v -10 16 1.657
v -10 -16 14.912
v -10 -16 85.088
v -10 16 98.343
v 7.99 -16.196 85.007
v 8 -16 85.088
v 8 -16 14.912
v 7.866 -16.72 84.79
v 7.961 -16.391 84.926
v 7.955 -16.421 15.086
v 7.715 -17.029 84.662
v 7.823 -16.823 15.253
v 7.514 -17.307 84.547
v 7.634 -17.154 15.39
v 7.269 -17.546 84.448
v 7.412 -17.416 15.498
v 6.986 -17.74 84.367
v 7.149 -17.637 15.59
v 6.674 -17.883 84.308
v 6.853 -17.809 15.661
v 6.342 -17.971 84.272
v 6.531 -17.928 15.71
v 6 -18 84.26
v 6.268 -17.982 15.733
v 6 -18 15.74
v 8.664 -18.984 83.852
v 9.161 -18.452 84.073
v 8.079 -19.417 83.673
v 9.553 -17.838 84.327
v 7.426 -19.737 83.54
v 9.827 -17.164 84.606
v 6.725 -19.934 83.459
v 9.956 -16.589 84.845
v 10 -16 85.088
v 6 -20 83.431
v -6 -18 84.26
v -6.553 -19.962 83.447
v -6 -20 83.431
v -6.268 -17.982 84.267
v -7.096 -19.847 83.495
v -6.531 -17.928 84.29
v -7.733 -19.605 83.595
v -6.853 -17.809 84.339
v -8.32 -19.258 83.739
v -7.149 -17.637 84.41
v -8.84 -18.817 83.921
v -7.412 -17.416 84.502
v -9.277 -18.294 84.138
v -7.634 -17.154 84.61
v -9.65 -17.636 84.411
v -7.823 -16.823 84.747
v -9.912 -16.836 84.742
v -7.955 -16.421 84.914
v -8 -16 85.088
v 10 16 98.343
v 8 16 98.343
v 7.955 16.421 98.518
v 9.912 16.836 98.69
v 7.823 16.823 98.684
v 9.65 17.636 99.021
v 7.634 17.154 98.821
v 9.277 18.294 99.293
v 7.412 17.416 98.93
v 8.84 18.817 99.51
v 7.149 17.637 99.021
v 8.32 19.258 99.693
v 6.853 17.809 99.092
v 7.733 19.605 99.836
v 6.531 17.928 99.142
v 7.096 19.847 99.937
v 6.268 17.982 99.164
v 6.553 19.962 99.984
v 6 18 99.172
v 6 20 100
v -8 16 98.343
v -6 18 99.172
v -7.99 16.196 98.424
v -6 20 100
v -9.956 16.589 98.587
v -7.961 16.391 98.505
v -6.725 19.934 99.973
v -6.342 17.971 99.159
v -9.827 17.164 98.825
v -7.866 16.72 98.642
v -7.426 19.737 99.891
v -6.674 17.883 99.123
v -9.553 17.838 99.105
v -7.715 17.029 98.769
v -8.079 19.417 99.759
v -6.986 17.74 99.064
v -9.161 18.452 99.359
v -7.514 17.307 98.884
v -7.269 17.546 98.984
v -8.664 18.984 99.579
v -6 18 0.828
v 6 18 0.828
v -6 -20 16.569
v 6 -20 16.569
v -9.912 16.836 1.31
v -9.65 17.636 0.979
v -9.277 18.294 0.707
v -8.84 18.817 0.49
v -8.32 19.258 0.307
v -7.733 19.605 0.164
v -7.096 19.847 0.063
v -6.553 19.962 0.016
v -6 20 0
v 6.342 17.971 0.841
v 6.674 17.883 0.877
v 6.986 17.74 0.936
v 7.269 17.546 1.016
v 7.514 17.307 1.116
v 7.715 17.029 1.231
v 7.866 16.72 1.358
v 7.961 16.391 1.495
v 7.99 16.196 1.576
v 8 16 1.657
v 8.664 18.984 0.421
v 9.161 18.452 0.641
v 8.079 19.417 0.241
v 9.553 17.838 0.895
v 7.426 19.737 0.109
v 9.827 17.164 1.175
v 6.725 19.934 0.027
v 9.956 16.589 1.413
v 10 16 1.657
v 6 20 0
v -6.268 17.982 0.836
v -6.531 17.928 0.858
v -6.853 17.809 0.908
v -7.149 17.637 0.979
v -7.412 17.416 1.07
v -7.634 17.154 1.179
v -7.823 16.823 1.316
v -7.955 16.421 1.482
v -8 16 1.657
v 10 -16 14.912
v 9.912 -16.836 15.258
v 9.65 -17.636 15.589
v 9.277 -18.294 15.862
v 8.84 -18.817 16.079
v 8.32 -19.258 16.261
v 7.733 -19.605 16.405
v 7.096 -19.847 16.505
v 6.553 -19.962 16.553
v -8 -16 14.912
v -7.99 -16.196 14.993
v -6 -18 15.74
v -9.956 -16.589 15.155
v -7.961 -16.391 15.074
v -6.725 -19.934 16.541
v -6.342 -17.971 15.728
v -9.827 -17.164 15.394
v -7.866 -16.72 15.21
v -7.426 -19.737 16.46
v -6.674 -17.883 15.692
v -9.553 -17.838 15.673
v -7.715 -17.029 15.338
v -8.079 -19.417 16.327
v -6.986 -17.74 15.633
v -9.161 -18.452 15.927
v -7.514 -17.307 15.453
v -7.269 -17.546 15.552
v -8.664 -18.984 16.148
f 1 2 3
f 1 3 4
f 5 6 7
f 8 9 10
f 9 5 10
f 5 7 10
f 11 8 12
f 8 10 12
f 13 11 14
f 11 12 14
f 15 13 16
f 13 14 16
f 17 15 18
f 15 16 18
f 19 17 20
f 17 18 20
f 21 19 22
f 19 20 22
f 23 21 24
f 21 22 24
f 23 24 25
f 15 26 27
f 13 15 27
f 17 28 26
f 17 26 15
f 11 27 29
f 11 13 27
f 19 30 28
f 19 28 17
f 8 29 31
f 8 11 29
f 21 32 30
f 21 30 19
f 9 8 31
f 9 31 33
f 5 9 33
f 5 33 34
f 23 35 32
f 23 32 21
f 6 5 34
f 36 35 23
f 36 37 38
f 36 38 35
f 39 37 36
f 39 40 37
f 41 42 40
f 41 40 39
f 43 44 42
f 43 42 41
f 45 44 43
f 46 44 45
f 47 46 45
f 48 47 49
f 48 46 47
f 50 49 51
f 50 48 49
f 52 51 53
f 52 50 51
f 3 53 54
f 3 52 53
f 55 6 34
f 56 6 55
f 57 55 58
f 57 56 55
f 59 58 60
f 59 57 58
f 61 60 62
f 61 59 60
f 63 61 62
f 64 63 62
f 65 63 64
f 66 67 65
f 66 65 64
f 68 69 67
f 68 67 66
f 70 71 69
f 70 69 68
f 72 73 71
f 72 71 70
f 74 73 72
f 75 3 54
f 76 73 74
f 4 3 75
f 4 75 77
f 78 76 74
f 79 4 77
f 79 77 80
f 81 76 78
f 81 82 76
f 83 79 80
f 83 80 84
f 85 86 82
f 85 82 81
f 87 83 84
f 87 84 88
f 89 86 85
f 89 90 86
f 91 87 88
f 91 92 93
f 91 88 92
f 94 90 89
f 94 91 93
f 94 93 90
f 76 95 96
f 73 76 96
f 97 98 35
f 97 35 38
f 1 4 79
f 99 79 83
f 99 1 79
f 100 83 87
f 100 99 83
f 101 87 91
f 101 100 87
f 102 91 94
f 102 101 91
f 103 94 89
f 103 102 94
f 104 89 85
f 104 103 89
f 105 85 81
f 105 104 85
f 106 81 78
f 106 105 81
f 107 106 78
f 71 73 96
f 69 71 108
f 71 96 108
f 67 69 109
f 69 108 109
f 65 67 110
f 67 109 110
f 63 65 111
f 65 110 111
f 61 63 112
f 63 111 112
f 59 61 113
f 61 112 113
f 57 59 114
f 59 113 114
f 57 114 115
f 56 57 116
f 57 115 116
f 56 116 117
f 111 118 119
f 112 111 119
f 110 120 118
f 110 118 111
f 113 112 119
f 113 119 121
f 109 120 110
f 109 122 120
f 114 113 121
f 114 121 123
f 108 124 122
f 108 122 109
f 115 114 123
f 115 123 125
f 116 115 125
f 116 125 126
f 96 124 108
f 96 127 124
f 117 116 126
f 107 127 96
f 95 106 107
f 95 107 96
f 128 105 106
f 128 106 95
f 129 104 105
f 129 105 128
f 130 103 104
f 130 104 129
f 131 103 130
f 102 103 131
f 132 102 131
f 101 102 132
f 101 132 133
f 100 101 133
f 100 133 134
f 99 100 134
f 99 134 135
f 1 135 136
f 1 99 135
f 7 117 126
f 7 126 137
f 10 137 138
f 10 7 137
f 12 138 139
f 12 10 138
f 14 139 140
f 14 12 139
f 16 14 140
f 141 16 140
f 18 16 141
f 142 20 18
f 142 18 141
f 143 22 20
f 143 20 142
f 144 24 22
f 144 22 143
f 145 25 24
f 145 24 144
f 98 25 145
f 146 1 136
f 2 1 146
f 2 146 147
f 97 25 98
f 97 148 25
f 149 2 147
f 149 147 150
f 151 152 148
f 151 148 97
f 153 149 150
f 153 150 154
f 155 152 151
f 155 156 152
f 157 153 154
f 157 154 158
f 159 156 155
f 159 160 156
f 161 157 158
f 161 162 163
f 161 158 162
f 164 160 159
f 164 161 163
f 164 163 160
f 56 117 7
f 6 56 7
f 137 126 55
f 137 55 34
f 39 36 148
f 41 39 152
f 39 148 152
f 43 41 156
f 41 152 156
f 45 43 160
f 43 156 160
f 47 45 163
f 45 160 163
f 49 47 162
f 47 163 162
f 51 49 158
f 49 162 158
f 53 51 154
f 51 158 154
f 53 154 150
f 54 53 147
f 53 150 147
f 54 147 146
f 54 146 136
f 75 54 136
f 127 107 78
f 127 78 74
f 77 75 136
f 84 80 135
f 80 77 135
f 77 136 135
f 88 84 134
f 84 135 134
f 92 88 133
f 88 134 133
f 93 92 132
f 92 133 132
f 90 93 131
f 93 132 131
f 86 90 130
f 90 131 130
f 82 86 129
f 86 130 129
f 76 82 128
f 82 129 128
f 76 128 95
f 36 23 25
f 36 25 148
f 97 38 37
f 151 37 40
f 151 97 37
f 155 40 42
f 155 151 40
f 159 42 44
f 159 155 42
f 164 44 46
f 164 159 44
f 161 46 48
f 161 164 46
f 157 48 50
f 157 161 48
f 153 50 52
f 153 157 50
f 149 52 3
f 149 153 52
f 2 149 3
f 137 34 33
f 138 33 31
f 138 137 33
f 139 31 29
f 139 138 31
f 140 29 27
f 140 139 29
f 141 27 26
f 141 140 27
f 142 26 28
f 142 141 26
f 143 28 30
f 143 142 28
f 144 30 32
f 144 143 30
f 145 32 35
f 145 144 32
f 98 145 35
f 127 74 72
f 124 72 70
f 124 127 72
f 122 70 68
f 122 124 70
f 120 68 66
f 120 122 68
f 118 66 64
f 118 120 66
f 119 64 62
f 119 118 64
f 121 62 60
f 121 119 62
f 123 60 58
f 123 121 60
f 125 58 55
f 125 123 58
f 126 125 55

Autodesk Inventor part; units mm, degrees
ref_plane "Start Plane" through (0, 0, 0) normal (0, 0, 1) x (1, 0, 0)
ref_plane "End Plane" through (0, 0, 100) normal (0, 0, 1) x (1, 0, 0)
sketch "Sketch" plane through (0, 0, 0) normal (0, 0, 1) x (1, 0, 0)
  line L0 (-10, -16) -> (-10, 16)
  line L1 (-6, 20) -> (6, 20)
  line L2 (10, 16) -> (10, -16)
  line L3 (6, -20) -> (-6, -20)
  arc A0 (-10, -16) -> (-6, -20) centre (-6, -16) ccw
  arc A1 (10, 16) -> (6, 20) centre (6, 16) ccw
  arc A2 (-6, 20) -> (-10, 16) centre (-6, 16) ccw
  arc A3 (6, -20) -> (10, -16) centre (6, -16) ccw
  arc A4 (-6, 18) -> (-8, 16) centre (-6, 16) ccw
  line L4 (-6, 18) -> (6, 18)
  arc A5 (8, 16) -> (6, 18) centre (6, 16) ccw
  line L5 (8, 16) -> (8, -16)
  arc A6 (6, -18) -> (8, -16) centre (6, -16) ccw
  line L6 (6, -18) -> (-6, -18)
  arc A7 (-8, -16) -> (-6, -18) centre (-6, -16) ccw
  line L7 (-8, -16) -> (-8, 16)
  line L8 (0, 29.1598) -> (0, -29.1598) construction
  line L9 (-15.1598, 0) -> (15.1598, 0) construction
  dimension "d7" = 4
  dimension "d9" = 20
  dimension "d11" = 40
  dimension "d12" = 2
  dimension "d15" = 10
  dimension "d16" = 20
extrude "Body" add sketch "Sketch" along normal up to surface (100 mm away) from surface at 0
sketch "Sketch3" plane through (0, 0, 0) normal (0, 0, 1) x (1, 0, 0)
  line L0 (0, 0) -> (10, 0)
ref_plane "Work Plane3" through (0, 0, 0) normal (0, -1, 0) x (1, 0, 0)
ref_plane "Work Plane4" through (0, 20, 100) normal (0, -0.3827, 0.9239) x (1, 0, 0)
split "Split1" plane through (0, 20, 100) removes the side toward (0, -0.3827, 0.9239)
ref_plane "Work Plane5" through (0, 20, 0) normal (0, -0.3827, -0.9239) x (1, 0, 0)
split "Split2" plane through (0, 20, 0) removes the side toward (0, -0.3827, -0.9239)
sketch "Sketch4" plane through (0, 0, 0) normal (0, -1, 0) x (1, 0, 0)
  line L0 (-2, 0) -> (12, 0) projected
  line L1 (-2, 100) -> (12, 100) projected
  dimension "d18" = 100
equation "\"d7\" = G_IR"
equation "\"d9\" = G_W"
equation "\"d11\" = G_H"
equation "\"d12\" = G_T"
equation "\"d15\" = 0.5 * d9"
equation "\"d16\" = 0.5 * d11"
equation "\"d3\" = G_L"
equation "\"G_W\" = 20"
equation "\"G_H\" = 40"
equation "\"G_T\" = 2"
equation "\"G_IR\" = 4"
equation "\"G_L\" = d18"
equation "\"G_OFFSET_START\" = 0"
equation "\"G_OFFSET_END\" = 0"
properties part number "ISO 4019 - 40x20x2 - 100" material "Steel, Mild"
